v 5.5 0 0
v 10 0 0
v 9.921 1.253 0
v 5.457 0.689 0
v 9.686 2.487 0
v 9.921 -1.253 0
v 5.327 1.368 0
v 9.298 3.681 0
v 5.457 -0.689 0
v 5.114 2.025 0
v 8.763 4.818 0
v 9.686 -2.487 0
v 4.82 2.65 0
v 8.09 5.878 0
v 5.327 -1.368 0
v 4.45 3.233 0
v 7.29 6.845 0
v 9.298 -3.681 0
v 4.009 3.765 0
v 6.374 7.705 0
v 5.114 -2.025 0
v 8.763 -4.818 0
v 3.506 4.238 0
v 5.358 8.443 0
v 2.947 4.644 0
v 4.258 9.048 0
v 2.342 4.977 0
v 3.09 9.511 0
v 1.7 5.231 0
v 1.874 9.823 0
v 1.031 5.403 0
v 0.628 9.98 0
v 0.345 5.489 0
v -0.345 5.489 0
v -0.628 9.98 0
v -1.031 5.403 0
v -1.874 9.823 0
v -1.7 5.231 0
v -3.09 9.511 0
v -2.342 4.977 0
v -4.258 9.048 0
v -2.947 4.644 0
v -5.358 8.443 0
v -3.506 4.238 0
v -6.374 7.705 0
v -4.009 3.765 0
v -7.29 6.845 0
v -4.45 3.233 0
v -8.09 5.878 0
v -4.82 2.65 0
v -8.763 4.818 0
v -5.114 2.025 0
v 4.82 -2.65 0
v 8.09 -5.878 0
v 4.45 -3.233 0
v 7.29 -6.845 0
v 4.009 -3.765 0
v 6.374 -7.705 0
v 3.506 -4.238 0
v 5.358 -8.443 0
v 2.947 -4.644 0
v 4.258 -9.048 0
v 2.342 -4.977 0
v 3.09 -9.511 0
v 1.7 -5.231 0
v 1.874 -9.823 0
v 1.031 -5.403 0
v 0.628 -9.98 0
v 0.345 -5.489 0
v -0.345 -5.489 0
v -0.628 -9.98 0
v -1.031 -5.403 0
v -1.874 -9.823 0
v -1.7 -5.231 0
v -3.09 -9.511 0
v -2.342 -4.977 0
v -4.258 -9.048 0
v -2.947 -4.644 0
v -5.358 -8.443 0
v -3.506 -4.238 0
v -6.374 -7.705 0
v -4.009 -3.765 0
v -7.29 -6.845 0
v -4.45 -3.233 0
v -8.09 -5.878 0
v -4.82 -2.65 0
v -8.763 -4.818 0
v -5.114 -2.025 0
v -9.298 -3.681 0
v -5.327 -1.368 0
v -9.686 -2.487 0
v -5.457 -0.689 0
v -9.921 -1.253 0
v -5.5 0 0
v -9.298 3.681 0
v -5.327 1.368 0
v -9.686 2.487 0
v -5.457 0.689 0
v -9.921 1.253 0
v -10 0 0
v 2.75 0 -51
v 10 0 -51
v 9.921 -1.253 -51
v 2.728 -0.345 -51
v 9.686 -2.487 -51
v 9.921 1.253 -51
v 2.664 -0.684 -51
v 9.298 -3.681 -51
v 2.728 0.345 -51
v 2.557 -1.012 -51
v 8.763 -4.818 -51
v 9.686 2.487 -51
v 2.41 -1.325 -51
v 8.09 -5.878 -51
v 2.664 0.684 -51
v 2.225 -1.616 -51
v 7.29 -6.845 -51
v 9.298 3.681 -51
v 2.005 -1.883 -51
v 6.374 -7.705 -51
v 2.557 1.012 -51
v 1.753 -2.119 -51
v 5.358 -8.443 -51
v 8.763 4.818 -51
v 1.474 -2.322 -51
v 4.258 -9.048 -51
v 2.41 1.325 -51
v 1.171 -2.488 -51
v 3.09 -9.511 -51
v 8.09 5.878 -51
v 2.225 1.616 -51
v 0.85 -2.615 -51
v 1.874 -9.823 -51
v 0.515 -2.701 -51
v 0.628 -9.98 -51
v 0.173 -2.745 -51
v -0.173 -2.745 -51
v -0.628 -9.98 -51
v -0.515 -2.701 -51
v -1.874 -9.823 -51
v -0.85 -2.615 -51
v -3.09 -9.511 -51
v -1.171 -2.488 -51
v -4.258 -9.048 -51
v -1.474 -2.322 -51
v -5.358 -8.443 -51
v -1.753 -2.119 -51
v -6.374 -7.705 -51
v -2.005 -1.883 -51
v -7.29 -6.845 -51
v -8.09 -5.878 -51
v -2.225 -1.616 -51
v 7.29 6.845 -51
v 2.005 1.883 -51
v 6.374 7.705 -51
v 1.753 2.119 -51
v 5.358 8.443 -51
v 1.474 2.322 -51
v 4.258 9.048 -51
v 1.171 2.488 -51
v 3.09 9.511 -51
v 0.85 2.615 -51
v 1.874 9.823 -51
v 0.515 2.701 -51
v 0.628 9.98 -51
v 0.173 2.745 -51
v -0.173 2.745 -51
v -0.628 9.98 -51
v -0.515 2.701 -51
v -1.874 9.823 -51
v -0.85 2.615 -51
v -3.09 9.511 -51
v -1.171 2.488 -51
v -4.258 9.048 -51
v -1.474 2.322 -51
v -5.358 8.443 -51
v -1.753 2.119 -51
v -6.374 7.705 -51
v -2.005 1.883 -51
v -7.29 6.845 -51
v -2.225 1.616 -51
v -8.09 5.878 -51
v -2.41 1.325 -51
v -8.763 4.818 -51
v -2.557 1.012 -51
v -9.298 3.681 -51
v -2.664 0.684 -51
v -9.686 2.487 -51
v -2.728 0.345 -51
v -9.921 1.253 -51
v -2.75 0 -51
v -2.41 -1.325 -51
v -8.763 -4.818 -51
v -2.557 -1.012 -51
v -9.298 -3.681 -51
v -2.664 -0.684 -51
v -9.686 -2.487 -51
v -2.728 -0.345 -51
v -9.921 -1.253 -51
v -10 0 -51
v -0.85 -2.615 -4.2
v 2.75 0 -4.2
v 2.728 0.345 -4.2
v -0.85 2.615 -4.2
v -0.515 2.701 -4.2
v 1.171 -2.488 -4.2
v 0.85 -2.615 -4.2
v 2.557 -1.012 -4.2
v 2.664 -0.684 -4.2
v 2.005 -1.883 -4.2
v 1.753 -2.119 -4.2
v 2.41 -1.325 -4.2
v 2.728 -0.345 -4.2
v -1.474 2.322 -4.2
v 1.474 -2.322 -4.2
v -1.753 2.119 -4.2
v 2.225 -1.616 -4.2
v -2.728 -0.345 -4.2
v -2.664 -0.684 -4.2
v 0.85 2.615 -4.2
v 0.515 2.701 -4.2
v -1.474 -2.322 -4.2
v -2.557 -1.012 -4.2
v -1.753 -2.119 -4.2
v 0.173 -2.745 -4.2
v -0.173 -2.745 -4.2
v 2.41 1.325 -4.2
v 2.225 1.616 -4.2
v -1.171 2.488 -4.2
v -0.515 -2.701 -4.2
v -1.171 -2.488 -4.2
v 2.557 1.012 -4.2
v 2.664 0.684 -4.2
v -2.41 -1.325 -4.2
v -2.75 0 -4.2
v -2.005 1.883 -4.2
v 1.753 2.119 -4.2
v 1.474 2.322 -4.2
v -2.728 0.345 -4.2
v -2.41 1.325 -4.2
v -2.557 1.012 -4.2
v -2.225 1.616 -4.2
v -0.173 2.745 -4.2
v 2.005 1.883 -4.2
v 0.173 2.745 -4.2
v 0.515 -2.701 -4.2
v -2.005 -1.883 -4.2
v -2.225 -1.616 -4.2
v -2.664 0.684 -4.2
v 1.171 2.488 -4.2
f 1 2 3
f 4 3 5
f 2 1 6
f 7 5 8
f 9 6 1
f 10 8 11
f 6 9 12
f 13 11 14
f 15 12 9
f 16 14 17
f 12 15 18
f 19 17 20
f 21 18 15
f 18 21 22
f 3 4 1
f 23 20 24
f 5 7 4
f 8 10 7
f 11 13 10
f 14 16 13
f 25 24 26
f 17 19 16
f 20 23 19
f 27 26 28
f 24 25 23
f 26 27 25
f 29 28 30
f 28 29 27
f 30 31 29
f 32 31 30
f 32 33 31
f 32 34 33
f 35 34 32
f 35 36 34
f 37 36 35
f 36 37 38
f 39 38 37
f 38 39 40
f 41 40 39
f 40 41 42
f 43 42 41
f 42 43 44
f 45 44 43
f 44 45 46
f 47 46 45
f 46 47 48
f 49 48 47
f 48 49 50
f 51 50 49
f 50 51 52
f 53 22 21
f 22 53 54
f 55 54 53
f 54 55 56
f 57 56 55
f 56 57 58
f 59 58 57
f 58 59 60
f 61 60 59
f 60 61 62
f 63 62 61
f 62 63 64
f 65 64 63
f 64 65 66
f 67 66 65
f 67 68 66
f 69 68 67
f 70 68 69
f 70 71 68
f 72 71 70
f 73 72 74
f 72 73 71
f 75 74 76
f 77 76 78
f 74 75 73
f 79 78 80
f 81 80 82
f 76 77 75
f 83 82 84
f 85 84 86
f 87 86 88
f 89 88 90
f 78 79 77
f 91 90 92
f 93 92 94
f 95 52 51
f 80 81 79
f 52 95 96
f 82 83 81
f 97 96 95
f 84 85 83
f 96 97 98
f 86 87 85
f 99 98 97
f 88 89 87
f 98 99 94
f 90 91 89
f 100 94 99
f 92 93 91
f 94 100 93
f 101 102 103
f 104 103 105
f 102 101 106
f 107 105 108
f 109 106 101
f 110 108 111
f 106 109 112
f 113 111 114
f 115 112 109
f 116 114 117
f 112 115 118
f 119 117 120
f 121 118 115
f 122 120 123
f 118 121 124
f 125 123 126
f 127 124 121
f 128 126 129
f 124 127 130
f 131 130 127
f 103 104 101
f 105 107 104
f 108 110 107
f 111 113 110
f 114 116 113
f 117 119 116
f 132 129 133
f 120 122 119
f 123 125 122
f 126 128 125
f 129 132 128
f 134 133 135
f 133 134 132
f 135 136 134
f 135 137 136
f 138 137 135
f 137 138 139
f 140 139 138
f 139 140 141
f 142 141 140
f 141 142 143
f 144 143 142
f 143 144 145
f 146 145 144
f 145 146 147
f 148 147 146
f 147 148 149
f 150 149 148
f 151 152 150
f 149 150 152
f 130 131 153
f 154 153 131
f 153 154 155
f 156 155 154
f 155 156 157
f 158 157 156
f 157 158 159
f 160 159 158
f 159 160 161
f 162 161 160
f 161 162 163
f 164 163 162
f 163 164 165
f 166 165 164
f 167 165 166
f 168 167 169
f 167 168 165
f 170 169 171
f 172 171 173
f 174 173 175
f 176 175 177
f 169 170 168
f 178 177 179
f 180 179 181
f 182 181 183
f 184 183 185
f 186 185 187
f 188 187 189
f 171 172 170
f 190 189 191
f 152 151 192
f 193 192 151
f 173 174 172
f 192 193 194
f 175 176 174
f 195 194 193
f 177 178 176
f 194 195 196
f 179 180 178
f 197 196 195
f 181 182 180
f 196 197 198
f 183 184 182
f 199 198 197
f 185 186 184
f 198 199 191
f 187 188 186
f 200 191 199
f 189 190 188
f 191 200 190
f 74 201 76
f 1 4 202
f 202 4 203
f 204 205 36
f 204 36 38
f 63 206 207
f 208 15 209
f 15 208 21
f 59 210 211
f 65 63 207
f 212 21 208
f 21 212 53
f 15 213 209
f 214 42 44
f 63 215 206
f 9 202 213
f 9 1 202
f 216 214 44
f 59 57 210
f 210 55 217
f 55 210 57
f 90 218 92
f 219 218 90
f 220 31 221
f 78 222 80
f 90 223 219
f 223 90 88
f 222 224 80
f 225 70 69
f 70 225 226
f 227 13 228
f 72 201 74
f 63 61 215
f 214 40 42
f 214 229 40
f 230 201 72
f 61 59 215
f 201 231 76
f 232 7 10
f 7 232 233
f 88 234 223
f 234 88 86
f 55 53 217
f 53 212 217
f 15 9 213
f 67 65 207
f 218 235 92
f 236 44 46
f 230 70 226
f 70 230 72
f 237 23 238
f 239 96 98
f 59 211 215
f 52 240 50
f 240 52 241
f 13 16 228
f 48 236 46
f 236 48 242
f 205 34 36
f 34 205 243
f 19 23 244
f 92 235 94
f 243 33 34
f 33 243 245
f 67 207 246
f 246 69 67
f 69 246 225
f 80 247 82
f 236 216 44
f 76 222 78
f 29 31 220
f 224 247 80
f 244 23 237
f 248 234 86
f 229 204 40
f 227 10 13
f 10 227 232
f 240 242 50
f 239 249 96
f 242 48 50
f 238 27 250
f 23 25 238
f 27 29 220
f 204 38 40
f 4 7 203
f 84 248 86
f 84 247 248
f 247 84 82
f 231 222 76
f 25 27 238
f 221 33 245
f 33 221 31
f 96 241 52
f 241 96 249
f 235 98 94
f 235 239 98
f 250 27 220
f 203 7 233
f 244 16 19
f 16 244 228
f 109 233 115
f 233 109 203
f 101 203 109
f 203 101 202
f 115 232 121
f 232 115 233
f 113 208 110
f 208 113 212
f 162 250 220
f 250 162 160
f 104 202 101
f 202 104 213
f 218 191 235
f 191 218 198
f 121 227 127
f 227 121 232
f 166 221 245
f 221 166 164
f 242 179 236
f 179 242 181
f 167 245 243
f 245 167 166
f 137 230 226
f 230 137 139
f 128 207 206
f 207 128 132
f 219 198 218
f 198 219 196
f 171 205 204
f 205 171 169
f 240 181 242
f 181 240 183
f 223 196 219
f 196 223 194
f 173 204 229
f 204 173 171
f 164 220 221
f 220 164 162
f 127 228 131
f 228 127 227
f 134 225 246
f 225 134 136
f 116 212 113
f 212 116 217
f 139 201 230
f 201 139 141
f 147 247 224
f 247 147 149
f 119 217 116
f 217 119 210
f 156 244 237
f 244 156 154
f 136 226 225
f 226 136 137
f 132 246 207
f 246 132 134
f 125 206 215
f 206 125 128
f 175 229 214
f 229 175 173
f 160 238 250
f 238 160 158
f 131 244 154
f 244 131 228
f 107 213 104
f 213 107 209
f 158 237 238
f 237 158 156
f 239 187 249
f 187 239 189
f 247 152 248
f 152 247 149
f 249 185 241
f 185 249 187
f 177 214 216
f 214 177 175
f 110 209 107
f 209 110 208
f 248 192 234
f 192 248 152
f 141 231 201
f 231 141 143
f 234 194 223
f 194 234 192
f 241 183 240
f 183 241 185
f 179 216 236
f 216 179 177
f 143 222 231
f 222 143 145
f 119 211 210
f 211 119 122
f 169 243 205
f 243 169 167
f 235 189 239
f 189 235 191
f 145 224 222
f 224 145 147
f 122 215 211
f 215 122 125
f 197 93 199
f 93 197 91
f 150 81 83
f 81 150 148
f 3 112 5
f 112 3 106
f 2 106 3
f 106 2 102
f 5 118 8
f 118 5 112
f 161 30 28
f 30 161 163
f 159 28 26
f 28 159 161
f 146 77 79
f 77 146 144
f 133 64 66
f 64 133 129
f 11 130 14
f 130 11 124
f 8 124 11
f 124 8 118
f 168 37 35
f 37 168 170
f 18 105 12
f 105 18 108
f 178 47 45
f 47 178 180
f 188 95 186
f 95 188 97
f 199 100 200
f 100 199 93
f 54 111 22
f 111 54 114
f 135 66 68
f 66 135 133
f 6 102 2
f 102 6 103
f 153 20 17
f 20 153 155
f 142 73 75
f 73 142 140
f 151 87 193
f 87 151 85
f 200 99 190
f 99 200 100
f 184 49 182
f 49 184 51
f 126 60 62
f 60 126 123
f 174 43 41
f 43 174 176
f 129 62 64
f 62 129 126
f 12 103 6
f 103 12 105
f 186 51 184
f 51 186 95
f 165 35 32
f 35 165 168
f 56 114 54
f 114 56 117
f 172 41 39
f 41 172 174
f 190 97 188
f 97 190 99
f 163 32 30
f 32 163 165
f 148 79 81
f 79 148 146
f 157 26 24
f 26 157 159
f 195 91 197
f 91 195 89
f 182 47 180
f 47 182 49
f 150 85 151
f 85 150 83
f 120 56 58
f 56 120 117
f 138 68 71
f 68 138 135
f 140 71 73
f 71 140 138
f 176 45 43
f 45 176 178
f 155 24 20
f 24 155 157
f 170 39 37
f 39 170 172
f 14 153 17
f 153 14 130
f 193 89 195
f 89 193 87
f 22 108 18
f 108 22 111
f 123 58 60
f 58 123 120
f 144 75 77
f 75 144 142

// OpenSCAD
$fn = 50;


difference() {
	union() {
		translate(v = [0, 0, -51.0000000000]) {
			cylinder(h = 51, r = 10.0000000000);
		}
		cylinder(h = 0, r = 20.0000000000);
	}
	union() {
		translate(v = [0, 0, 0]) {
			rotate(a = [0, 0, 0]) {
				difference() {
					union() {
						#translate(v = [0, 0, -51.0000000000]) {
							cylinder(h = 51, r = 2.2500000000);
						}
						#translate(v = [0, 0, -4.2000000000]) {
							cylinder(h = 4.2000000000, r1 = 2.7500000000, r2 = 5.5000000000);
						}
						#translate(v = [0, 0, -51.0000000000]) {
							cylinder(h = 51, r = 2.7500000000);
						}
						#translate(v = [0, 0, -51.0000000000]) {
							cylinder(h = 51, r = 2.2500000000);
						}
					}
					union();
				}
			}
		}
	}
}
